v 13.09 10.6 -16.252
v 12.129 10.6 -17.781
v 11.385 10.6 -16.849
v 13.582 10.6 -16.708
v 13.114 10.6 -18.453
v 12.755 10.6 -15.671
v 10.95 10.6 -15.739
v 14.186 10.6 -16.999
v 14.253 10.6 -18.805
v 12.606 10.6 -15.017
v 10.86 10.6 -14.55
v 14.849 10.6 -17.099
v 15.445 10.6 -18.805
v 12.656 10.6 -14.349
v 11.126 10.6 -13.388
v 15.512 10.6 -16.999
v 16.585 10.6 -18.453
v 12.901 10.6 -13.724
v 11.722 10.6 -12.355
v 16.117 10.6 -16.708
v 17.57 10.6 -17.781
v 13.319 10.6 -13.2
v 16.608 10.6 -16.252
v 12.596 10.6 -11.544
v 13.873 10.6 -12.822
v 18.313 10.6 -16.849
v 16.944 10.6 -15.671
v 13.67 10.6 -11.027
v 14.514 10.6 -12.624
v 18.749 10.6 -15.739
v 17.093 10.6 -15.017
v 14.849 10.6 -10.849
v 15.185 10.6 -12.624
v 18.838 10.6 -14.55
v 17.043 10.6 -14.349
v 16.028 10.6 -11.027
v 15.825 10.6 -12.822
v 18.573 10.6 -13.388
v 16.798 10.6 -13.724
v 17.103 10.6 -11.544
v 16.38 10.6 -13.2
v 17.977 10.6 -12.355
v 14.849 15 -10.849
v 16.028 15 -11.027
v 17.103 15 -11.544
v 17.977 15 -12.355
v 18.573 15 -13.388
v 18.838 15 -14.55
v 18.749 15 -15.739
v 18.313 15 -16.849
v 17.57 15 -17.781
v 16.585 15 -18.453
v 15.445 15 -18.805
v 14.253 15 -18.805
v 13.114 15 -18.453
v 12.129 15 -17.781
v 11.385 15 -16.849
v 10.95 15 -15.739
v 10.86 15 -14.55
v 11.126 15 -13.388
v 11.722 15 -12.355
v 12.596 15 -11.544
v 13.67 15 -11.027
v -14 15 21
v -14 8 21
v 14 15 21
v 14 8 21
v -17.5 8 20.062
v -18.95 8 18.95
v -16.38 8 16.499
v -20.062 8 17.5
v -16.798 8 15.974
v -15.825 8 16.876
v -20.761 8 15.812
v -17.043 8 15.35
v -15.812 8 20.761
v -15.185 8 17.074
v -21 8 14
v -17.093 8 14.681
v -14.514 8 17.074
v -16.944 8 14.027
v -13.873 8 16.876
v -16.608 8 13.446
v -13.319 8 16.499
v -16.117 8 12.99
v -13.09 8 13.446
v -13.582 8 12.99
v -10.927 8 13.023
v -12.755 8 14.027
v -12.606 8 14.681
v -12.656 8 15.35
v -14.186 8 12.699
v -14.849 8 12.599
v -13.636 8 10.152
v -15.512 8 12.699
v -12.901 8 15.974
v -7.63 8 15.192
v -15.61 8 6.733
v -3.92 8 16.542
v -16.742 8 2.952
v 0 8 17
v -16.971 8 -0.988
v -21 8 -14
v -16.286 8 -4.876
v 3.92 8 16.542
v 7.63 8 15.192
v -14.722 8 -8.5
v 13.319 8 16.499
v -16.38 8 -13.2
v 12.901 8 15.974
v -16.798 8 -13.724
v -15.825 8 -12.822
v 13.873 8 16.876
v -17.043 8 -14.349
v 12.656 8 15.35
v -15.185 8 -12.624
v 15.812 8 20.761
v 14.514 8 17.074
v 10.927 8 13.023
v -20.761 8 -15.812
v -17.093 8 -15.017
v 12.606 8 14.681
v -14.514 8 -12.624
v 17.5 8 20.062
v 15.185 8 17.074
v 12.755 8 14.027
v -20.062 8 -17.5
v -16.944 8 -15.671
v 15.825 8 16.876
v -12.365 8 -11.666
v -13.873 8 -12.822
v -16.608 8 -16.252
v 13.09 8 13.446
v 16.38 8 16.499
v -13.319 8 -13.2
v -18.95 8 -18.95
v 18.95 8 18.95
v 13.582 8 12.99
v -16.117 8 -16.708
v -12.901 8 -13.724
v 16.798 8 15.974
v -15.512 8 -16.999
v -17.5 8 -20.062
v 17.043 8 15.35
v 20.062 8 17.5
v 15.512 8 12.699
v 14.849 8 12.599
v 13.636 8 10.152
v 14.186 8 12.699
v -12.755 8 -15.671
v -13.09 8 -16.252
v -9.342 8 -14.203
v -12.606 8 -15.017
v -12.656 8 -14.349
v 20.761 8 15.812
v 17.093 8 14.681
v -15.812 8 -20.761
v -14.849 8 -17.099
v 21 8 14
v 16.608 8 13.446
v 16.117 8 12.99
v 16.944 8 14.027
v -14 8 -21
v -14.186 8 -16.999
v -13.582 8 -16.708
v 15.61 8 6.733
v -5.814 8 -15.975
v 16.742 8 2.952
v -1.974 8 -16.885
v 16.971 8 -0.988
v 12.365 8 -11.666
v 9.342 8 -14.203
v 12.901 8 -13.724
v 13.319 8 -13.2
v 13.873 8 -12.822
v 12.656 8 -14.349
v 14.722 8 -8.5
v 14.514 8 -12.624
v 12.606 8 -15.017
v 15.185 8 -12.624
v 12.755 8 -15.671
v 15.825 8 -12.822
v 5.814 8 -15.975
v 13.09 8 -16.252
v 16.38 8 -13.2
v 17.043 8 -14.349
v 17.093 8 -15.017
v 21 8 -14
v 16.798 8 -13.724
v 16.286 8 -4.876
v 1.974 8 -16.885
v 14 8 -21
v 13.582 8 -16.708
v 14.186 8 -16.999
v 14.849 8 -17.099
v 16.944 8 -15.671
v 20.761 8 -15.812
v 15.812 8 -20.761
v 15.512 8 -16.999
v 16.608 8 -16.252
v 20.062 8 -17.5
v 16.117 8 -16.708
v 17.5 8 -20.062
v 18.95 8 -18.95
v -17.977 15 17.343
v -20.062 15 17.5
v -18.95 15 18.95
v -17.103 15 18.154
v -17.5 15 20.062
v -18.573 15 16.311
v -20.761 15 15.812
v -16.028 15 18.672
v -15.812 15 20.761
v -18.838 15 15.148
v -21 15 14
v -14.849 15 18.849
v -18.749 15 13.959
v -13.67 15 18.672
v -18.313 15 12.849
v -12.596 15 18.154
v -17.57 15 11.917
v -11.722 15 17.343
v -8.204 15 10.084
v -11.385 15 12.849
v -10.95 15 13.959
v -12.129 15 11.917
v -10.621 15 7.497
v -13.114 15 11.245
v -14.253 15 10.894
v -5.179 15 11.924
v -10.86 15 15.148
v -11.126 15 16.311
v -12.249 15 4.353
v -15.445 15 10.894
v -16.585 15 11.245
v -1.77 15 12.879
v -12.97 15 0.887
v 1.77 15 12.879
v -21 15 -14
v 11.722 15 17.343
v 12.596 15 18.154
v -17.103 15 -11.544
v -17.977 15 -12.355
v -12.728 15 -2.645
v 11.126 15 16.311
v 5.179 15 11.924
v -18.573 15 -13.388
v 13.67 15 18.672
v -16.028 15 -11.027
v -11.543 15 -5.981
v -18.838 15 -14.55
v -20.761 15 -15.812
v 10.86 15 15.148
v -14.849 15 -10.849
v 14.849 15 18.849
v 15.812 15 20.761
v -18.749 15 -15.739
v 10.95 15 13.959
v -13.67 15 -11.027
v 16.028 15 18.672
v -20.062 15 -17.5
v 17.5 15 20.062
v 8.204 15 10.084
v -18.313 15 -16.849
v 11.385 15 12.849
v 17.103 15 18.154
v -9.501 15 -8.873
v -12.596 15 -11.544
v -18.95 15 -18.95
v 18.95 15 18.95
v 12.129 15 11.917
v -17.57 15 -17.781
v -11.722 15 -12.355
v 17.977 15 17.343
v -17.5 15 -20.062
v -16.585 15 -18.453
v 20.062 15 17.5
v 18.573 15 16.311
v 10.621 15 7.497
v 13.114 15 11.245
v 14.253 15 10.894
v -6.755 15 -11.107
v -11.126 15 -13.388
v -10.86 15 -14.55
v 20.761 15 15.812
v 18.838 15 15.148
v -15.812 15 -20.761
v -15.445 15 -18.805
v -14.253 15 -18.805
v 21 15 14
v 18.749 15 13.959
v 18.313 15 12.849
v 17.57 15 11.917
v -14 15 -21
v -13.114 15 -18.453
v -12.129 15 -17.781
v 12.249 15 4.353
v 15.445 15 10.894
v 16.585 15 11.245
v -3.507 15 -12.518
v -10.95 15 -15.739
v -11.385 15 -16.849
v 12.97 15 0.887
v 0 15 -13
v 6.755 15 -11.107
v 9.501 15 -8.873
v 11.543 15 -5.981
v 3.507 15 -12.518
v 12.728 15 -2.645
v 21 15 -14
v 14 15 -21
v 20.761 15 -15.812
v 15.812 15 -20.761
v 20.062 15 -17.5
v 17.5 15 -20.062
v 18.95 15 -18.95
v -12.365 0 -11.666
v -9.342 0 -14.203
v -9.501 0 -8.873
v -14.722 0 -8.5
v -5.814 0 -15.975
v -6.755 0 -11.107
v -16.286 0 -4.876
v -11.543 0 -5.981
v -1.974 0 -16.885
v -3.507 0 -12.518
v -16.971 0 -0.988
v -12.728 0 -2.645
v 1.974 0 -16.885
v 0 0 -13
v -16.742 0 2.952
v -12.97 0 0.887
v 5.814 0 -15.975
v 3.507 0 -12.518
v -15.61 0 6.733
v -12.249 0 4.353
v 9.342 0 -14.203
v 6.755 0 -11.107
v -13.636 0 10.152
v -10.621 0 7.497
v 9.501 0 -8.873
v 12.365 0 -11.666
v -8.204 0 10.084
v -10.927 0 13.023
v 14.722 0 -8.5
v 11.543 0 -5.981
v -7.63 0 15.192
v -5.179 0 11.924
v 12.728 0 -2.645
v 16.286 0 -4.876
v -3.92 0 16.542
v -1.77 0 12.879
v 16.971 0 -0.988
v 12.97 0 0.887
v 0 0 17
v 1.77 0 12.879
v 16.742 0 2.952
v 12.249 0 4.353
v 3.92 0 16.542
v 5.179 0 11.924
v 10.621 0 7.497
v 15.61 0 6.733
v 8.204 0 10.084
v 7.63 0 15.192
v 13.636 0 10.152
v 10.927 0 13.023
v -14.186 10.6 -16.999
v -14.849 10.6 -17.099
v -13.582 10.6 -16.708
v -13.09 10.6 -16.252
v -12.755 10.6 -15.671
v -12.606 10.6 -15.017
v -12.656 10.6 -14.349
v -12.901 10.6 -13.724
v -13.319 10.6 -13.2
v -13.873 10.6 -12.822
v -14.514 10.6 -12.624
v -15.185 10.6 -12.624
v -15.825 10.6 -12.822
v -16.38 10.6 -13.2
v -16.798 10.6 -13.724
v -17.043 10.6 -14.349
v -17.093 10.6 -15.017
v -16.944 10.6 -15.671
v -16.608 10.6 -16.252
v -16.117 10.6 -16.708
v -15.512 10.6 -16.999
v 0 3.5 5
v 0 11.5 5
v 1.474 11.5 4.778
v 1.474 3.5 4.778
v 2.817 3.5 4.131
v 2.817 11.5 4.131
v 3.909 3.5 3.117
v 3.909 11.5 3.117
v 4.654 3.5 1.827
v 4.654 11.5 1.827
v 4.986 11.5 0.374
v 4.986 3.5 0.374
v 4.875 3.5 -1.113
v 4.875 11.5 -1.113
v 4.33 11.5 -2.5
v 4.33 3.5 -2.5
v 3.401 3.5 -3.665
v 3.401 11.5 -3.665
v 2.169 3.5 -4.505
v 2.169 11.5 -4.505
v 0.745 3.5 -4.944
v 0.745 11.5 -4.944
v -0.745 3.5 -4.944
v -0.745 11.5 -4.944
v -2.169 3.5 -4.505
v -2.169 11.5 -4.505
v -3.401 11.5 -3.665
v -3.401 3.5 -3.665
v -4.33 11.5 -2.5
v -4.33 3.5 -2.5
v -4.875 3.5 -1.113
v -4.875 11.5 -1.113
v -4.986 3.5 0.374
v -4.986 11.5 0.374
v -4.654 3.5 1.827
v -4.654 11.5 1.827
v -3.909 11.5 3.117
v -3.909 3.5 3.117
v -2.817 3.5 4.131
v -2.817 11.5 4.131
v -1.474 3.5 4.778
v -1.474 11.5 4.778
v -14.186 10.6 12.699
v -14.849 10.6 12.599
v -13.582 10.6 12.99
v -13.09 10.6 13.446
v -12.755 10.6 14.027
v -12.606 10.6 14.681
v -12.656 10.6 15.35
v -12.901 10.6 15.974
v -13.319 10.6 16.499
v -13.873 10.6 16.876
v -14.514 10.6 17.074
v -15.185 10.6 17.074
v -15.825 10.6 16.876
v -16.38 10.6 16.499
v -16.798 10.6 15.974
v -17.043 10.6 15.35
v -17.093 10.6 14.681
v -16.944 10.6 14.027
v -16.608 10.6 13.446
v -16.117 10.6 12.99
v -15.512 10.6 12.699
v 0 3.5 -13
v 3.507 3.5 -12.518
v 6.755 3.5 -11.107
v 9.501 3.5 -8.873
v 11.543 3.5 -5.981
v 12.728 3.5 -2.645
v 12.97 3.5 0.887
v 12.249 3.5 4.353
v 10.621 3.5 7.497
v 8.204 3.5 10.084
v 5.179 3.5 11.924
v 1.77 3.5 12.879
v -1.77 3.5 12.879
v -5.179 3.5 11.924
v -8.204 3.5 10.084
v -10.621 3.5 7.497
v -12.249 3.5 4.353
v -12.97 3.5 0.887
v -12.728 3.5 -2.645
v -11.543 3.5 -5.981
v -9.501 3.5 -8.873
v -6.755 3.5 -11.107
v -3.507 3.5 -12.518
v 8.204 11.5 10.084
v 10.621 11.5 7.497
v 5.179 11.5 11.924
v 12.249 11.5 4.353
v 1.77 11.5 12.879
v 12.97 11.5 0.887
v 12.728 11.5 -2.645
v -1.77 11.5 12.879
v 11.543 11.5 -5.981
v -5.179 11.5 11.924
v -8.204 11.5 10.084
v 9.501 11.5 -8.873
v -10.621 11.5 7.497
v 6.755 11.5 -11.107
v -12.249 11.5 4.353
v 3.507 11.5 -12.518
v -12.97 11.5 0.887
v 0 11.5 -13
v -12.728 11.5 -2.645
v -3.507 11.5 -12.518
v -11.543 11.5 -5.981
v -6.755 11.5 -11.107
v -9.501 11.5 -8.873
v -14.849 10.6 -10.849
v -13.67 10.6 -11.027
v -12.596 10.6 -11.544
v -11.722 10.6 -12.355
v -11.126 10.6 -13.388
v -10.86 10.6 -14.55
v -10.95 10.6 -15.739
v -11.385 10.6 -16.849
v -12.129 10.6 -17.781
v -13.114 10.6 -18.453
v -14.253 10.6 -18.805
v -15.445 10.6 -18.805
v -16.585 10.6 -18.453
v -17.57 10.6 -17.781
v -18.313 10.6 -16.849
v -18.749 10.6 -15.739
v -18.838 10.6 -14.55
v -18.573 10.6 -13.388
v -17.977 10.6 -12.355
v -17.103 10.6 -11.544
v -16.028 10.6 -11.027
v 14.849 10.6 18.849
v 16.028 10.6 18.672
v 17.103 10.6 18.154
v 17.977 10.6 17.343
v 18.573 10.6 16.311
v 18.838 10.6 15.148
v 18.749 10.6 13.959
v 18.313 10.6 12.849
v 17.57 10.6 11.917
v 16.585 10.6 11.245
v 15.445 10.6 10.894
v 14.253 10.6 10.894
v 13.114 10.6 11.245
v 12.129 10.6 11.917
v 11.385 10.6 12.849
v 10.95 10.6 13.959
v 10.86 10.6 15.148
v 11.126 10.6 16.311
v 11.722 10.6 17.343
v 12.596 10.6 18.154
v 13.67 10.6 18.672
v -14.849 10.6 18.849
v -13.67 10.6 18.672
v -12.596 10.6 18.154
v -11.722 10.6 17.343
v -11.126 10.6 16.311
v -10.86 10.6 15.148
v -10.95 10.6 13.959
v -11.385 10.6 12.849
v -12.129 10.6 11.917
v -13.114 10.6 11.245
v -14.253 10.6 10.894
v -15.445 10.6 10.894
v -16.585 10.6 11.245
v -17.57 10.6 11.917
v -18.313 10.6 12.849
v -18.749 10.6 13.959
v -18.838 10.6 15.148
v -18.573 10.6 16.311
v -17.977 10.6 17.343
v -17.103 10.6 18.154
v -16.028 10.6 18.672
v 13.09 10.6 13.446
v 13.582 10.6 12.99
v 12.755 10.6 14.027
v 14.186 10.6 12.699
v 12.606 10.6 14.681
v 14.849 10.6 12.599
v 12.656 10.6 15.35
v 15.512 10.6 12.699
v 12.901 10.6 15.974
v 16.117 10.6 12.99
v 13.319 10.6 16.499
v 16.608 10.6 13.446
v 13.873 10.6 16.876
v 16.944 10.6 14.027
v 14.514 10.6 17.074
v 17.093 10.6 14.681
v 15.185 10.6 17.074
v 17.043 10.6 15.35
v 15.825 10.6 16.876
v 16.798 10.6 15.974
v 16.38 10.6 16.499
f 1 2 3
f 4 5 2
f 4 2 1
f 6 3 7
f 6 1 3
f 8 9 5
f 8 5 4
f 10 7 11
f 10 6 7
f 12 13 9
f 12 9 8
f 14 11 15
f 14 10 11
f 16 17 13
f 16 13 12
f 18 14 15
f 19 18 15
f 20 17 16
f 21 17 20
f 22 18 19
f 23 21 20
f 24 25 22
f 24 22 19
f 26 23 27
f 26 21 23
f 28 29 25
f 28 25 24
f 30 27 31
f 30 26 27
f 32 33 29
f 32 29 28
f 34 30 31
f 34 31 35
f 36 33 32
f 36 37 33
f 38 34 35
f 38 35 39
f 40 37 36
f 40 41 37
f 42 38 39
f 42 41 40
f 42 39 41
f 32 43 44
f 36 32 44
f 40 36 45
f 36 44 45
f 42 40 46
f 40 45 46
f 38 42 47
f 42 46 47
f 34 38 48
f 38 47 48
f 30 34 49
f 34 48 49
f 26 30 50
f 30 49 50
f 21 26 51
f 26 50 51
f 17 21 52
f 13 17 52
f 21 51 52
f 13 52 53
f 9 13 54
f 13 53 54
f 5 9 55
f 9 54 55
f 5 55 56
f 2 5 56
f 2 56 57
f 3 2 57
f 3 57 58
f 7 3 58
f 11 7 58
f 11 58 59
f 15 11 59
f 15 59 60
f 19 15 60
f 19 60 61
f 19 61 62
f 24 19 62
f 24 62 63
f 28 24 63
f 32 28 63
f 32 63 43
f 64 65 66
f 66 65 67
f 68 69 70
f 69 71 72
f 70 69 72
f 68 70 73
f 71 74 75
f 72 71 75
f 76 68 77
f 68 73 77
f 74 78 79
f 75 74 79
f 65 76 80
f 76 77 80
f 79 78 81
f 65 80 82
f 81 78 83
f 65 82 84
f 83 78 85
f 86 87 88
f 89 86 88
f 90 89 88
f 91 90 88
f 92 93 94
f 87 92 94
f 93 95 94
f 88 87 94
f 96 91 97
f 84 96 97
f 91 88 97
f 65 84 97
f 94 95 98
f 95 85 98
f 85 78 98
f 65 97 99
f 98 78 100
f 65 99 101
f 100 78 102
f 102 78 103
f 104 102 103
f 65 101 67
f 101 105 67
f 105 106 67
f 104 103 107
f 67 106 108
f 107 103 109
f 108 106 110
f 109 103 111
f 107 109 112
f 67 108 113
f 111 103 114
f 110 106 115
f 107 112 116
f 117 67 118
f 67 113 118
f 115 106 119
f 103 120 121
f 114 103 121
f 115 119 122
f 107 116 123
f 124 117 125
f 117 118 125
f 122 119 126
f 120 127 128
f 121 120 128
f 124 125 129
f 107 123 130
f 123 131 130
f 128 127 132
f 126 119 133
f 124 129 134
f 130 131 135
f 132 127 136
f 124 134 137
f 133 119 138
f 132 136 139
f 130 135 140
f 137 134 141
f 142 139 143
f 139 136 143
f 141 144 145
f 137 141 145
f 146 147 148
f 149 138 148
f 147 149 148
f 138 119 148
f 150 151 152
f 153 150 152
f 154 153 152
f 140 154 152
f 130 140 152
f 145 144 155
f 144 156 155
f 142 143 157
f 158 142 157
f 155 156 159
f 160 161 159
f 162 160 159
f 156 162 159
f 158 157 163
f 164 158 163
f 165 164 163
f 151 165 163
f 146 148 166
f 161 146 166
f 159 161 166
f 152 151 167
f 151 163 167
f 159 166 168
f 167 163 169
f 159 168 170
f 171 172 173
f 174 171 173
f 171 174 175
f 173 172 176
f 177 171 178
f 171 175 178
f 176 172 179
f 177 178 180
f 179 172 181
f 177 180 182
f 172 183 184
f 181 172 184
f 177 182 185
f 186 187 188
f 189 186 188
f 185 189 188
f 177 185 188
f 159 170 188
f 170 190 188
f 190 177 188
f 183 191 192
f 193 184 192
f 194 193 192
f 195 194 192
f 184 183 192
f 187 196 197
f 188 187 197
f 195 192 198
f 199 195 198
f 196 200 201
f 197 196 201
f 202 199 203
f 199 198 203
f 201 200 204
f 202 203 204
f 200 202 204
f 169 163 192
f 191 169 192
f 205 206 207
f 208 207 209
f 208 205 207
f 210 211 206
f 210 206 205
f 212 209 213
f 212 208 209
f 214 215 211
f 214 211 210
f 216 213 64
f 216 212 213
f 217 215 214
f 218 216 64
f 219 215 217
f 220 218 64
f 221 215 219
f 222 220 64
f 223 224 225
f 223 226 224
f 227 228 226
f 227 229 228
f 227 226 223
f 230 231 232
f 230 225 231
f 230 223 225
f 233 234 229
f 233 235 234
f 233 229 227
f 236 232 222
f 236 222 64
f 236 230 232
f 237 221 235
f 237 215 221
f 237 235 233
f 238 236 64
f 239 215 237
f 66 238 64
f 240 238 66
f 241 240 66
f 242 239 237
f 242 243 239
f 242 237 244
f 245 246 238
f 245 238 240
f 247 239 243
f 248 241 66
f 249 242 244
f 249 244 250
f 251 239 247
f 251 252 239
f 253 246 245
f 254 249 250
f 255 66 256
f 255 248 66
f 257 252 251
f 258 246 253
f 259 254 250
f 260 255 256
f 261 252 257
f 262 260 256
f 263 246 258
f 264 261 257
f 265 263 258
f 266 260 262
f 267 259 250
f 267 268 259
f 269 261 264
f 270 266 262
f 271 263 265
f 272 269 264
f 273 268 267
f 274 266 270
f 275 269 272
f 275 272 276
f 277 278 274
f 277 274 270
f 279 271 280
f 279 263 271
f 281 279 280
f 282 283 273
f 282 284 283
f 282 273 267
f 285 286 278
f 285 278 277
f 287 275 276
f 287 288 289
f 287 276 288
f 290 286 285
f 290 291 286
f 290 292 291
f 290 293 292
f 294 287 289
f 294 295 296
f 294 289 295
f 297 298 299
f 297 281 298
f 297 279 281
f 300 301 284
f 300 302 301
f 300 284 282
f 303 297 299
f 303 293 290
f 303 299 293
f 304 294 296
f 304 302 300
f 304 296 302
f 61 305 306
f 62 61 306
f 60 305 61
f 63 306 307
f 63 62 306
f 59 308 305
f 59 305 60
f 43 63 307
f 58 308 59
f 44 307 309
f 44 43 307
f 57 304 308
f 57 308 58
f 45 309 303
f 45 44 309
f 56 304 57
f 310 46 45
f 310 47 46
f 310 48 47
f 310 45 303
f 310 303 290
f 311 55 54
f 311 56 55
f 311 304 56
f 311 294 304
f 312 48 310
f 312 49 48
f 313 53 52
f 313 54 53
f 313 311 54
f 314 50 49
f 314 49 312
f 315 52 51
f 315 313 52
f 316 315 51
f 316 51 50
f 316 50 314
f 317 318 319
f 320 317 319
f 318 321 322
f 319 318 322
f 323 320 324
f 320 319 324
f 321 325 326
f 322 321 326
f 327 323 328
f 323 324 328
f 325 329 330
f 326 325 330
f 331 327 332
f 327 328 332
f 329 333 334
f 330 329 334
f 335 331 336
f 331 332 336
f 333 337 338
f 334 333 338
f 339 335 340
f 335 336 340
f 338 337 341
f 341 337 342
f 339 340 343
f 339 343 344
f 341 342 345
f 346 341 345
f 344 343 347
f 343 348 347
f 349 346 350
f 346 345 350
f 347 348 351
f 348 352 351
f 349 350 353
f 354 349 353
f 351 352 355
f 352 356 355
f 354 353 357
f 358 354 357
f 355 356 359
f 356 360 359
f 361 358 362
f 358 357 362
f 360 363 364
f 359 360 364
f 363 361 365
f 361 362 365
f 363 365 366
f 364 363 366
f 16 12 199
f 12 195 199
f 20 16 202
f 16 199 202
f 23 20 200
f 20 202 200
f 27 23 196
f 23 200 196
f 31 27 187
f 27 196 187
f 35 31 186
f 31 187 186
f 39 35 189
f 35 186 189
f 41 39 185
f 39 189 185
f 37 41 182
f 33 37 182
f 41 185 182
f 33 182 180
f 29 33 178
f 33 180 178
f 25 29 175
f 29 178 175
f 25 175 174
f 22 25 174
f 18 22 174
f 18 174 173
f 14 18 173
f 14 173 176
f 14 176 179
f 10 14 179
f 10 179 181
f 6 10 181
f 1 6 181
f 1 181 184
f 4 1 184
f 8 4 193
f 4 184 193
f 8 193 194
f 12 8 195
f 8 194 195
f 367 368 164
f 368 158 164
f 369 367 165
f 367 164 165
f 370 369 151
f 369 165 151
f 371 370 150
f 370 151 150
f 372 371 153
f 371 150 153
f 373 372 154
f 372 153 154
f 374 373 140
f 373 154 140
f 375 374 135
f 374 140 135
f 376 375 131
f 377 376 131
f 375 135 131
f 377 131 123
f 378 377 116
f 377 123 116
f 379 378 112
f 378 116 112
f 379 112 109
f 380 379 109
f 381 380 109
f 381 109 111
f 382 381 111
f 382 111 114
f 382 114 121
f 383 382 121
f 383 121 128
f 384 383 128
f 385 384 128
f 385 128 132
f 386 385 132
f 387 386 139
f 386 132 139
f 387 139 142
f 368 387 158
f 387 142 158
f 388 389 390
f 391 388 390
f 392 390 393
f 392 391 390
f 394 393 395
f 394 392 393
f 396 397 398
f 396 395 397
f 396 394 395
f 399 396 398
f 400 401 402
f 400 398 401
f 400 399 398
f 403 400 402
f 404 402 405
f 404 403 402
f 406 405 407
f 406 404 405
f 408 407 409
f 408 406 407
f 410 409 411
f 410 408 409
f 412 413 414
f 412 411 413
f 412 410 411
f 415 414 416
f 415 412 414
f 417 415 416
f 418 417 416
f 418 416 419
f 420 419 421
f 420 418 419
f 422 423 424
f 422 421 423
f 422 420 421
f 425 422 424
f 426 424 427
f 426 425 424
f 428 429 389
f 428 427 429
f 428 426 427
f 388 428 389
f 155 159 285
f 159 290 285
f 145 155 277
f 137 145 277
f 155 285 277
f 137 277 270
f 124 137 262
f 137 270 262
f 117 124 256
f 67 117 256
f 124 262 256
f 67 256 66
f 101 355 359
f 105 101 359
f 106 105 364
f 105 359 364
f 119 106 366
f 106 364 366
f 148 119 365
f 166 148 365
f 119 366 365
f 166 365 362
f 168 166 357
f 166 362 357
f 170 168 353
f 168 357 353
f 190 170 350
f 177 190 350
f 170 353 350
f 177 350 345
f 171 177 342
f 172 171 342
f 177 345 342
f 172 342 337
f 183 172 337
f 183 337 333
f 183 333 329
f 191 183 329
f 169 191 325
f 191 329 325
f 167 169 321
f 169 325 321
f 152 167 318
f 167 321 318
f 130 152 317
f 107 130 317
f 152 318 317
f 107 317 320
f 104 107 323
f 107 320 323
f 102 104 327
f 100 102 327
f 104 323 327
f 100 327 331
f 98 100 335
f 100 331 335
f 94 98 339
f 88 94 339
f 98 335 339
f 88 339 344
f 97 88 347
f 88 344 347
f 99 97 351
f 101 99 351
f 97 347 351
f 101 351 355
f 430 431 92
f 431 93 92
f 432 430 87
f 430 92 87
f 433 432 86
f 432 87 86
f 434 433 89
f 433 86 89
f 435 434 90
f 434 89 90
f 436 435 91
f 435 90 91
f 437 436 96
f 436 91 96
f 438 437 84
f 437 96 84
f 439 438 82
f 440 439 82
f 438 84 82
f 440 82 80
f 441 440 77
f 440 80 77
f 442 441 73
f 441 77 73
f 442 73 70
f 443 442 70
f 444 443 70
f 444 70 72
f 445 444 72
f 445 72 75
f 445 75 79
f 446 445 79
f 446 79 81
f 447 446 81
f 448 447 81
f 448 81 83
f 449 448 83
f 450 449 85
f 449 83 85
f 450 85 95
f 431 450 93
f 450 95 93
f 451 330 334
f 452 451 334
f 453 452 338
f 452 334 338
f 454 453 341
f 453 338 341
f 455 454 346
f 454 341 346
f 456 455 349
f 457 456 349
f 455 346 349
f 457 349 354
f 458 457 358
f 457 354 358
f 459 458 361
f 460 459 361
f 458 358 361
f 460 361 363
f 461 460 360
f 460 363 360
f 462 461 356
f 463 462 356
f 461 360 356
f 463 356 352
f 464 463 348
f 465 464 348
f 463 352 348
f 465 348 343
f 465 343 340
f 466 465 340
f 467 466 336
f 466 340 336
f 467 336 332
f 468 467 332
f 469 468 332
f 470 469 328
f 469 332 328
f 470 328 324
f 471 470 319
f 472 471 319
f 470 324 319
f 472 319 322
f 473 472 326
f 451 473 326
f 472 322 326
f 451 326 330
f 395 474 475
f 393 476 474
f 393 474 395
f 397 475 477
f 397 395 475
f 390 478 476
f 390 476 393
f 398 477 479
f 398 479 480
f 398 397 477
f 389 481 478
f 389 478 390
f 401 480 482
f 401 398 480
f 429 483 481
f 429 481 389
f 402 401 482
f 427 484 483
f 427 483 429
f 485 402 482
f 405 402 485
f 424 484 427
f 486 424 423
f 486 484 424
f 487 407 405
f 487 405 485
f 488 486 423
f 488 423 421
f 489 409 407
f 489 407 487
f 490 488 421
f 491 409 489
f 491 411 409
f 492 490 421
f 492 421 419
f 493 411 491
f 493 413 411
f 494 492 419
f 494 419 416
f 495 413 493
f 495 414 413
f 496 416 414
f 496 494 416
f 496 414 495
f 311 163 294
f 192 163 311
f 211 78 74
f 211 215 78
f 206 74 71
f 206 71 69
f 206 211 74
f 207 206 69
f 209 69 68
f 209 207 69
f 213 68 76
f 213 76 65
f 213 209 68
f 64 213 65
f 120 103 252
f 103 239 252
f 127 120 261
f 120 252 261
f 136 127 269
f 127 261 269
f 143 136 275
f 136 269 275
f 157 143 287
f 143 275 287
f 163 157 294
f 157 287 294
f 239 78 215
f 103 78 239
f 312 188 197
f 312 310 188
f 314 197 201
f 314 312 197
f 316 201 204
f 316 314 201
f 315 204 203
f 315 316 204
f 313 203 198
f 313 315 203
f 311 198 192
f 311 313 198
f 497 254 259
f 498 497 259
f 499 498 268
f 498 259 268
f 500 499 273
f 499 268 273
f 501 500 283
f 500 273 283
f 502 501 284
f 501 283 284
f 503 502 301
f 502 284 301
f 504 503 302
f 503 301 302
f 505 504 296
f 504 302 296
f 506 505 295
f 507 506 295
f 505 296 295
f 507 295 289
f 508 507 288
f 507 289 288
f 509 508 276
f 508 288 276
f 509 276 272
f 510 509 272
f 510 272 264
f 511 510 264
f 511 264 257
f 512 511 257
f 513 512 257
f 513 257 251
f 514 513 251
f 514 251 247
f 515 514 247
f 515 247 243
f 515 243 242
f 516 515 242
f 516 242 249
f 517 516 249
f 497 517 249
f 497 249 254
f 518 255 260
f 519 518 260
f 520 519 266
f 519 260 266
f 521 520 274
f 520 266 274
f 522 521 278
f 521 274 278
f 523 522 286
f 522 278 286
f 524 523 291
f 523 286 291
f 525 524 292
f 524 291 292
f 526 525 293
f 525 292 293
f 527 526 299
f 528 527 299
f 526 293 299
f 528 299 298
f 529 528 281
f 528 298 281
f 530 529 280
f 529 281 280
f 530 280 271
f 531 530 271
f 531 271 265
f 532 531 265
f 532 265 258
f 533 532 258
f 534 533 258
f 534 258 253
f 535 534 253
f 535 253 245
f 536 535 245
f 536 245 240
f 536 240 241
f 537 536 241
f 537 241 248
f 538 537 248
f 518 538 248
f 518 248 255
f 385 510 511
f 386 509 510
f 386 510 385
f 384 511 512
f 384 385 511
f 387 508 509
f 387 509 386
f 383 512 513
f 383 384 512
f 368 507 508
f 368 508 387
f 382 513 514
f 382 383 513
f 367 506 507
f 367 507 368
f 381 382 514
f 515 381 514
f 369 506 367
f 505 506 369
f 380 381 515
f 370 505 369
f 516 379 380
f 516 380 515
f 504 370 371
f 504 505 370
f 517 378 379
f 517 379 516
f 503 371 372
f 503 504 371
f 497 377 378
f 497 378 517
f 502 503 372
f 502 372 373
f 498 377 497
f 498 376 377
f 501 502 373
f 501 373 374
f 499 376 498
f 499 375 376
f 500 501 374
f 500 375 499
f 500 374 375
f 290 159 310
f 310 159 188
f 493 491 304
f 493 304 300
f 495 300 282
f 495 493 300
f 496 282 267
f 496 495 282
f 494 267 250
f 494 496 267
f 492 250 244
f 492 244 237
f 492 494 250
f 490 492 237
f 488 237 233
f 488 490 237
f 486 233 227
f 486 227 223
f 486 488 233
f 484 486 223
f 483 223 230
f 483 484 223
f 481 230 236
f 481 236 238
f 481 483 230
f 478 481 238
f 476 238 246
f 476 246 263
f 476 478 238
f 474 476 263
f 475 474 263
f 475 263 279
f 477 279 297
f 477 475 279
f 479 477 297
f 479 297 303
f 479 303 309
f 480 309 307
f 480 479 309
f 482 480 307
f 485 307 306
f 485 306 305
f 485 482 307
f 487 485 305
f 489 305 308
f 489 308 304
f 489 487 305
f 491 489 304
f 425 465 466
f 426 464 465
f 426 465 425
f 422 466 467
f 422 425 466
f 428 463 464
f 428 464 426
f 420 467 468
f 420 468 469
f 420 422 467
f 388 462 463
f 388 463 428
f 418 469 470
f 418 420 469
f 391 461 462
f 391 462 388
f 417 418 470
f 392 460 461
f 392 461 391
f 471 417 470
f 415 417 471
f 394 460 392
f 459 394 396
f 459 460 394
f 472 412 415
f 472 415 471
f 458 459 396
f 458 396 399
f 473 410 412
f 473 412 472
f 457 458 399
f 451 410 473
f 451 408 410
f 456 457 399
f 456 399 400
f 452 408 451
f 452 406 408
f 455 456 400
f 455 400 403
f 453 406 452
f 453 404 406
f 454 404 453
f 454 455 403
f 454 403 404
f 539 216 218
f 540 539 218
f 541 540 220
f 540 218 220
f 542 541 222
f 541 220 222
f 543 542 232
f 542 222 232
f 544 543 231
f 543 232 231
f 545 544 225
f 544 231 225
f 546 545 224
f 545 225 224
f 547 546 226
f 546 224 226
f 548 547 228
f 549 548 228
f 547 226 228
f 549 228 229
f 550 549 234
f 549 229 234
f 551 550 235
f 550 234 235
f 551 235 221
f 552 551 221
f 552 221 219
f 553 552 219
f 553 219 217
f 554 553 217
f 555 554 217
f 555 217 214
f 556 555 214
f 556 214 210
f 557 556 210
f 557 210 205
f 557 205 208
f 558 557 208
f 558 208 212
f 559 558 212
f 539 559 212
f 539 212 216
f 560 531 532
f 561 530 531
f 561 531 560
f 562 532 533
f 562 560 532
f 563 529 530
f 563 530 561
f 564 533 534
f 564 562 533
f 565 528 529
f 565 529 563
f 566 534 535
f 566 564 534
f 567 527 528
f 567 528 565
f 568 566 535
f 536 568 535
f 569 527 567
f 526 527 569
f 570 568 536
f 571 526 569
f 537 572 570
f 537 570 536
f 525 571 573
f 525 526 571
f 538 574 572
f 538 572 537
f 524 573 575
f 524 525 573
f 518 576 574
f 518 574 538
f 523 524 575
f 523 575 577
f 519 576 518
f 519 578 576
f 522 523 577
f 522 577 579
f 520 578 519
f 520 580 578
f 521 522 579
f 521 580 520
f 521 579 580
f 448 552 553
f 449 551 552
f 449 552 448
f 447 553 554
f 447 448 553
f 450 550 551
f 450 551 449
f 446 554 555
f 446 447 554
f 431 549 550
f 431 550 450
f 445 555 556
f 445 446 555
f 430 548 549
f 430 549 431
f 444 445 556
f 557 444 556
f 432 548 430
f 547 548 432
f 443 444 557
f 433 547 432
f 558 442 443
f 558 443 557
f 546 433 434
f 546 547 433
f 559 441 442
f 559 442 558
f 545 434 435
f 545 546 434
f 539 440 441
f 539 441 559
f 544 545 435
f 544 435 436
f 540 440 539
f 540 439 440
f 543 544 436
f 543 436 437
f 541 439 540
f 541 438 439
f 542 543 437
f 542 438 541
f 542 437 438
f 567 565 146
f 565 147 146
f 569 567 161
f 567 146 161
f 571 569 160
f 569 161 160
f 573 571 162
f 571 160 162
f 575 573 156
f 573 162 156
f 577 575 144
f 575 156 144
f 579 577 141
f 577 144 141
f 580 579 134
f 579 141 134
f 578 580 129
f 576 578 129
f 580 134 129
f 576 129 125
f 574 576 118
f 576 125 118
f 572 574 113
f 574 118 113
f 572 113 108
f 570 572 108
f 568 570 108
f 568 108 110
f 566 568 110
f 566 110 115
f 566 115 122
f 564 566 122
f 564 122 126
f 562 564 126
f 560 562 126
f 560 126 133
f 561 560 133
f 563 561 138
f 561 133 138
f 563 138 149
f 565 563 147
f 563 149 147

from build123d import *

# Parameters (mm, degrees)
SKETCH1_R                                           = 17
SKETCH1_R_2                                         = 5
BOSS_EXTRUDE1_DEPTH                                 = 8
SKETCH2_W                                           = 42
SKETCH2_H                                           = 42
SKETCH2_R                                           = 5
BOSS_EXTRUDE2_DEPTH                                 = 7
FILLET1_R                                           = 7
CBORE_FOR_M4_HEX_SOCKET_HEAD_CAP_SCREW1_D           = 4.5
CBORE_FOR_M4_HEX_SOCKET_HEAD_CAP_SCREW1_CBORE_D     = 8
CBORE_FOR_M4_HEX_SOCKET_HEAD_CAP_SCREW1_CBORE_DEPTH = 4.4
SKETCH5_R                                           = 13
CUT_EXTRUDE1_DEPTH                                  = 3.5
CUT_EXTRUDE2_START                                  = -3.5
SKETCH6_R                                           = 13
CUT_EXTRUDE2_DEPTH                                  = 3.5


with BuildPart() as part:
    # Sketch1 → Boss-Extrude1 (new body)
    with BuildSketch(Plane(origin=(0, 0, 0), x_dir=(1, 0, 0), z_dir=(0, 1, 0))):
        with Locations(Location((0, 0, 0), (0, 0, 270))):
            Circle(SKETCH1_R)
        with Locations(Location((0, 0, 0), (0, 0, 270))):
            Circle(SKETCH1_R_2, mode=Mode.SUBTRACT)
    extrude(amount=BOSS_EXTRUDE1_DEPTH)

    # Sketch2 → Boss-Extrude2 (add)
    with BuildSketch(Plane(origin=(0, 8, 0), x_dir=(1, 0, 0), z_dir=(0, 1, 0))):
        Rectangle(SKETCH2_W, SKETCH2_H)
        with Locations(Location((0, 0, 0), (0, 0, 270))):
            Circle(SKETCH2_R, mode=Mode.SUBTRACT)
    extrude(amount=BOSS_EXTRUDE2_DEPTH)

    # Fillet1
    fillet1_edges = [part.edges().sort_by_distance(p)[0] for p in [
        (-21, 11.5, -21),
        (-21, 11.5, 21),
        (21, 11.5, 21),
        (21, 11.5, -21),
    ]]
    fillet(fillet1_edges, radius=FILLET1_R)

    # CBORE for M4 Hex Socket Head Cap Screw1 (through all)
    with Locations(Plane(origin=(-14.849242405, 15, -14.849242405), x_dir=(0, 0, 1), z_dir=(0, 1, 0))):
        with Locations((0, 0), (0, 29.69848481), (29.69848481, 29.69848481), (29.69848481, 0)):
            CounterBoreHole(CBORE_FOR_M4_HEX_SOCKET_HEAD_CAP_SCREW1_D / 2, CBORE_FOR_M4_HEX_SOCKET_HEAD_CAP_SCREW1_CBORE_D / 2, CBORE_FOR_M4_HEX_SOCKET_HEAD_CAP_SCREW1_CBORE_DEPTH)

    # Sketch5 → Cut-Extrude1 (cut)
    with BuildSketch(Plane.XZ):
        with Locations(Location((0, 0, 0), (0, 0, 270))):
            Circle(SKETCH5_R)
    extrude(amount=-CUT_EXTRUDE1_DEPTH, mode=Mode.SUBTRACT)

    # Sketch6 → Cut-Extrude2 (cut)
    with BuildSketch(Plane(origin=(0, 15, 0), x_dir=(1, 0, 0), z_dir=(0, 1, 0)).offset(CUT_EXTRUDE2_START)):
        with Locations(Location((0, 0, 0), (0, 0, 90))):
            Circle(SKETCH6_R)
    extrude(amount=CUT_EXTRUDE2_DEPTH, mode=Mode.SUBTRACT)


solid = part.part
